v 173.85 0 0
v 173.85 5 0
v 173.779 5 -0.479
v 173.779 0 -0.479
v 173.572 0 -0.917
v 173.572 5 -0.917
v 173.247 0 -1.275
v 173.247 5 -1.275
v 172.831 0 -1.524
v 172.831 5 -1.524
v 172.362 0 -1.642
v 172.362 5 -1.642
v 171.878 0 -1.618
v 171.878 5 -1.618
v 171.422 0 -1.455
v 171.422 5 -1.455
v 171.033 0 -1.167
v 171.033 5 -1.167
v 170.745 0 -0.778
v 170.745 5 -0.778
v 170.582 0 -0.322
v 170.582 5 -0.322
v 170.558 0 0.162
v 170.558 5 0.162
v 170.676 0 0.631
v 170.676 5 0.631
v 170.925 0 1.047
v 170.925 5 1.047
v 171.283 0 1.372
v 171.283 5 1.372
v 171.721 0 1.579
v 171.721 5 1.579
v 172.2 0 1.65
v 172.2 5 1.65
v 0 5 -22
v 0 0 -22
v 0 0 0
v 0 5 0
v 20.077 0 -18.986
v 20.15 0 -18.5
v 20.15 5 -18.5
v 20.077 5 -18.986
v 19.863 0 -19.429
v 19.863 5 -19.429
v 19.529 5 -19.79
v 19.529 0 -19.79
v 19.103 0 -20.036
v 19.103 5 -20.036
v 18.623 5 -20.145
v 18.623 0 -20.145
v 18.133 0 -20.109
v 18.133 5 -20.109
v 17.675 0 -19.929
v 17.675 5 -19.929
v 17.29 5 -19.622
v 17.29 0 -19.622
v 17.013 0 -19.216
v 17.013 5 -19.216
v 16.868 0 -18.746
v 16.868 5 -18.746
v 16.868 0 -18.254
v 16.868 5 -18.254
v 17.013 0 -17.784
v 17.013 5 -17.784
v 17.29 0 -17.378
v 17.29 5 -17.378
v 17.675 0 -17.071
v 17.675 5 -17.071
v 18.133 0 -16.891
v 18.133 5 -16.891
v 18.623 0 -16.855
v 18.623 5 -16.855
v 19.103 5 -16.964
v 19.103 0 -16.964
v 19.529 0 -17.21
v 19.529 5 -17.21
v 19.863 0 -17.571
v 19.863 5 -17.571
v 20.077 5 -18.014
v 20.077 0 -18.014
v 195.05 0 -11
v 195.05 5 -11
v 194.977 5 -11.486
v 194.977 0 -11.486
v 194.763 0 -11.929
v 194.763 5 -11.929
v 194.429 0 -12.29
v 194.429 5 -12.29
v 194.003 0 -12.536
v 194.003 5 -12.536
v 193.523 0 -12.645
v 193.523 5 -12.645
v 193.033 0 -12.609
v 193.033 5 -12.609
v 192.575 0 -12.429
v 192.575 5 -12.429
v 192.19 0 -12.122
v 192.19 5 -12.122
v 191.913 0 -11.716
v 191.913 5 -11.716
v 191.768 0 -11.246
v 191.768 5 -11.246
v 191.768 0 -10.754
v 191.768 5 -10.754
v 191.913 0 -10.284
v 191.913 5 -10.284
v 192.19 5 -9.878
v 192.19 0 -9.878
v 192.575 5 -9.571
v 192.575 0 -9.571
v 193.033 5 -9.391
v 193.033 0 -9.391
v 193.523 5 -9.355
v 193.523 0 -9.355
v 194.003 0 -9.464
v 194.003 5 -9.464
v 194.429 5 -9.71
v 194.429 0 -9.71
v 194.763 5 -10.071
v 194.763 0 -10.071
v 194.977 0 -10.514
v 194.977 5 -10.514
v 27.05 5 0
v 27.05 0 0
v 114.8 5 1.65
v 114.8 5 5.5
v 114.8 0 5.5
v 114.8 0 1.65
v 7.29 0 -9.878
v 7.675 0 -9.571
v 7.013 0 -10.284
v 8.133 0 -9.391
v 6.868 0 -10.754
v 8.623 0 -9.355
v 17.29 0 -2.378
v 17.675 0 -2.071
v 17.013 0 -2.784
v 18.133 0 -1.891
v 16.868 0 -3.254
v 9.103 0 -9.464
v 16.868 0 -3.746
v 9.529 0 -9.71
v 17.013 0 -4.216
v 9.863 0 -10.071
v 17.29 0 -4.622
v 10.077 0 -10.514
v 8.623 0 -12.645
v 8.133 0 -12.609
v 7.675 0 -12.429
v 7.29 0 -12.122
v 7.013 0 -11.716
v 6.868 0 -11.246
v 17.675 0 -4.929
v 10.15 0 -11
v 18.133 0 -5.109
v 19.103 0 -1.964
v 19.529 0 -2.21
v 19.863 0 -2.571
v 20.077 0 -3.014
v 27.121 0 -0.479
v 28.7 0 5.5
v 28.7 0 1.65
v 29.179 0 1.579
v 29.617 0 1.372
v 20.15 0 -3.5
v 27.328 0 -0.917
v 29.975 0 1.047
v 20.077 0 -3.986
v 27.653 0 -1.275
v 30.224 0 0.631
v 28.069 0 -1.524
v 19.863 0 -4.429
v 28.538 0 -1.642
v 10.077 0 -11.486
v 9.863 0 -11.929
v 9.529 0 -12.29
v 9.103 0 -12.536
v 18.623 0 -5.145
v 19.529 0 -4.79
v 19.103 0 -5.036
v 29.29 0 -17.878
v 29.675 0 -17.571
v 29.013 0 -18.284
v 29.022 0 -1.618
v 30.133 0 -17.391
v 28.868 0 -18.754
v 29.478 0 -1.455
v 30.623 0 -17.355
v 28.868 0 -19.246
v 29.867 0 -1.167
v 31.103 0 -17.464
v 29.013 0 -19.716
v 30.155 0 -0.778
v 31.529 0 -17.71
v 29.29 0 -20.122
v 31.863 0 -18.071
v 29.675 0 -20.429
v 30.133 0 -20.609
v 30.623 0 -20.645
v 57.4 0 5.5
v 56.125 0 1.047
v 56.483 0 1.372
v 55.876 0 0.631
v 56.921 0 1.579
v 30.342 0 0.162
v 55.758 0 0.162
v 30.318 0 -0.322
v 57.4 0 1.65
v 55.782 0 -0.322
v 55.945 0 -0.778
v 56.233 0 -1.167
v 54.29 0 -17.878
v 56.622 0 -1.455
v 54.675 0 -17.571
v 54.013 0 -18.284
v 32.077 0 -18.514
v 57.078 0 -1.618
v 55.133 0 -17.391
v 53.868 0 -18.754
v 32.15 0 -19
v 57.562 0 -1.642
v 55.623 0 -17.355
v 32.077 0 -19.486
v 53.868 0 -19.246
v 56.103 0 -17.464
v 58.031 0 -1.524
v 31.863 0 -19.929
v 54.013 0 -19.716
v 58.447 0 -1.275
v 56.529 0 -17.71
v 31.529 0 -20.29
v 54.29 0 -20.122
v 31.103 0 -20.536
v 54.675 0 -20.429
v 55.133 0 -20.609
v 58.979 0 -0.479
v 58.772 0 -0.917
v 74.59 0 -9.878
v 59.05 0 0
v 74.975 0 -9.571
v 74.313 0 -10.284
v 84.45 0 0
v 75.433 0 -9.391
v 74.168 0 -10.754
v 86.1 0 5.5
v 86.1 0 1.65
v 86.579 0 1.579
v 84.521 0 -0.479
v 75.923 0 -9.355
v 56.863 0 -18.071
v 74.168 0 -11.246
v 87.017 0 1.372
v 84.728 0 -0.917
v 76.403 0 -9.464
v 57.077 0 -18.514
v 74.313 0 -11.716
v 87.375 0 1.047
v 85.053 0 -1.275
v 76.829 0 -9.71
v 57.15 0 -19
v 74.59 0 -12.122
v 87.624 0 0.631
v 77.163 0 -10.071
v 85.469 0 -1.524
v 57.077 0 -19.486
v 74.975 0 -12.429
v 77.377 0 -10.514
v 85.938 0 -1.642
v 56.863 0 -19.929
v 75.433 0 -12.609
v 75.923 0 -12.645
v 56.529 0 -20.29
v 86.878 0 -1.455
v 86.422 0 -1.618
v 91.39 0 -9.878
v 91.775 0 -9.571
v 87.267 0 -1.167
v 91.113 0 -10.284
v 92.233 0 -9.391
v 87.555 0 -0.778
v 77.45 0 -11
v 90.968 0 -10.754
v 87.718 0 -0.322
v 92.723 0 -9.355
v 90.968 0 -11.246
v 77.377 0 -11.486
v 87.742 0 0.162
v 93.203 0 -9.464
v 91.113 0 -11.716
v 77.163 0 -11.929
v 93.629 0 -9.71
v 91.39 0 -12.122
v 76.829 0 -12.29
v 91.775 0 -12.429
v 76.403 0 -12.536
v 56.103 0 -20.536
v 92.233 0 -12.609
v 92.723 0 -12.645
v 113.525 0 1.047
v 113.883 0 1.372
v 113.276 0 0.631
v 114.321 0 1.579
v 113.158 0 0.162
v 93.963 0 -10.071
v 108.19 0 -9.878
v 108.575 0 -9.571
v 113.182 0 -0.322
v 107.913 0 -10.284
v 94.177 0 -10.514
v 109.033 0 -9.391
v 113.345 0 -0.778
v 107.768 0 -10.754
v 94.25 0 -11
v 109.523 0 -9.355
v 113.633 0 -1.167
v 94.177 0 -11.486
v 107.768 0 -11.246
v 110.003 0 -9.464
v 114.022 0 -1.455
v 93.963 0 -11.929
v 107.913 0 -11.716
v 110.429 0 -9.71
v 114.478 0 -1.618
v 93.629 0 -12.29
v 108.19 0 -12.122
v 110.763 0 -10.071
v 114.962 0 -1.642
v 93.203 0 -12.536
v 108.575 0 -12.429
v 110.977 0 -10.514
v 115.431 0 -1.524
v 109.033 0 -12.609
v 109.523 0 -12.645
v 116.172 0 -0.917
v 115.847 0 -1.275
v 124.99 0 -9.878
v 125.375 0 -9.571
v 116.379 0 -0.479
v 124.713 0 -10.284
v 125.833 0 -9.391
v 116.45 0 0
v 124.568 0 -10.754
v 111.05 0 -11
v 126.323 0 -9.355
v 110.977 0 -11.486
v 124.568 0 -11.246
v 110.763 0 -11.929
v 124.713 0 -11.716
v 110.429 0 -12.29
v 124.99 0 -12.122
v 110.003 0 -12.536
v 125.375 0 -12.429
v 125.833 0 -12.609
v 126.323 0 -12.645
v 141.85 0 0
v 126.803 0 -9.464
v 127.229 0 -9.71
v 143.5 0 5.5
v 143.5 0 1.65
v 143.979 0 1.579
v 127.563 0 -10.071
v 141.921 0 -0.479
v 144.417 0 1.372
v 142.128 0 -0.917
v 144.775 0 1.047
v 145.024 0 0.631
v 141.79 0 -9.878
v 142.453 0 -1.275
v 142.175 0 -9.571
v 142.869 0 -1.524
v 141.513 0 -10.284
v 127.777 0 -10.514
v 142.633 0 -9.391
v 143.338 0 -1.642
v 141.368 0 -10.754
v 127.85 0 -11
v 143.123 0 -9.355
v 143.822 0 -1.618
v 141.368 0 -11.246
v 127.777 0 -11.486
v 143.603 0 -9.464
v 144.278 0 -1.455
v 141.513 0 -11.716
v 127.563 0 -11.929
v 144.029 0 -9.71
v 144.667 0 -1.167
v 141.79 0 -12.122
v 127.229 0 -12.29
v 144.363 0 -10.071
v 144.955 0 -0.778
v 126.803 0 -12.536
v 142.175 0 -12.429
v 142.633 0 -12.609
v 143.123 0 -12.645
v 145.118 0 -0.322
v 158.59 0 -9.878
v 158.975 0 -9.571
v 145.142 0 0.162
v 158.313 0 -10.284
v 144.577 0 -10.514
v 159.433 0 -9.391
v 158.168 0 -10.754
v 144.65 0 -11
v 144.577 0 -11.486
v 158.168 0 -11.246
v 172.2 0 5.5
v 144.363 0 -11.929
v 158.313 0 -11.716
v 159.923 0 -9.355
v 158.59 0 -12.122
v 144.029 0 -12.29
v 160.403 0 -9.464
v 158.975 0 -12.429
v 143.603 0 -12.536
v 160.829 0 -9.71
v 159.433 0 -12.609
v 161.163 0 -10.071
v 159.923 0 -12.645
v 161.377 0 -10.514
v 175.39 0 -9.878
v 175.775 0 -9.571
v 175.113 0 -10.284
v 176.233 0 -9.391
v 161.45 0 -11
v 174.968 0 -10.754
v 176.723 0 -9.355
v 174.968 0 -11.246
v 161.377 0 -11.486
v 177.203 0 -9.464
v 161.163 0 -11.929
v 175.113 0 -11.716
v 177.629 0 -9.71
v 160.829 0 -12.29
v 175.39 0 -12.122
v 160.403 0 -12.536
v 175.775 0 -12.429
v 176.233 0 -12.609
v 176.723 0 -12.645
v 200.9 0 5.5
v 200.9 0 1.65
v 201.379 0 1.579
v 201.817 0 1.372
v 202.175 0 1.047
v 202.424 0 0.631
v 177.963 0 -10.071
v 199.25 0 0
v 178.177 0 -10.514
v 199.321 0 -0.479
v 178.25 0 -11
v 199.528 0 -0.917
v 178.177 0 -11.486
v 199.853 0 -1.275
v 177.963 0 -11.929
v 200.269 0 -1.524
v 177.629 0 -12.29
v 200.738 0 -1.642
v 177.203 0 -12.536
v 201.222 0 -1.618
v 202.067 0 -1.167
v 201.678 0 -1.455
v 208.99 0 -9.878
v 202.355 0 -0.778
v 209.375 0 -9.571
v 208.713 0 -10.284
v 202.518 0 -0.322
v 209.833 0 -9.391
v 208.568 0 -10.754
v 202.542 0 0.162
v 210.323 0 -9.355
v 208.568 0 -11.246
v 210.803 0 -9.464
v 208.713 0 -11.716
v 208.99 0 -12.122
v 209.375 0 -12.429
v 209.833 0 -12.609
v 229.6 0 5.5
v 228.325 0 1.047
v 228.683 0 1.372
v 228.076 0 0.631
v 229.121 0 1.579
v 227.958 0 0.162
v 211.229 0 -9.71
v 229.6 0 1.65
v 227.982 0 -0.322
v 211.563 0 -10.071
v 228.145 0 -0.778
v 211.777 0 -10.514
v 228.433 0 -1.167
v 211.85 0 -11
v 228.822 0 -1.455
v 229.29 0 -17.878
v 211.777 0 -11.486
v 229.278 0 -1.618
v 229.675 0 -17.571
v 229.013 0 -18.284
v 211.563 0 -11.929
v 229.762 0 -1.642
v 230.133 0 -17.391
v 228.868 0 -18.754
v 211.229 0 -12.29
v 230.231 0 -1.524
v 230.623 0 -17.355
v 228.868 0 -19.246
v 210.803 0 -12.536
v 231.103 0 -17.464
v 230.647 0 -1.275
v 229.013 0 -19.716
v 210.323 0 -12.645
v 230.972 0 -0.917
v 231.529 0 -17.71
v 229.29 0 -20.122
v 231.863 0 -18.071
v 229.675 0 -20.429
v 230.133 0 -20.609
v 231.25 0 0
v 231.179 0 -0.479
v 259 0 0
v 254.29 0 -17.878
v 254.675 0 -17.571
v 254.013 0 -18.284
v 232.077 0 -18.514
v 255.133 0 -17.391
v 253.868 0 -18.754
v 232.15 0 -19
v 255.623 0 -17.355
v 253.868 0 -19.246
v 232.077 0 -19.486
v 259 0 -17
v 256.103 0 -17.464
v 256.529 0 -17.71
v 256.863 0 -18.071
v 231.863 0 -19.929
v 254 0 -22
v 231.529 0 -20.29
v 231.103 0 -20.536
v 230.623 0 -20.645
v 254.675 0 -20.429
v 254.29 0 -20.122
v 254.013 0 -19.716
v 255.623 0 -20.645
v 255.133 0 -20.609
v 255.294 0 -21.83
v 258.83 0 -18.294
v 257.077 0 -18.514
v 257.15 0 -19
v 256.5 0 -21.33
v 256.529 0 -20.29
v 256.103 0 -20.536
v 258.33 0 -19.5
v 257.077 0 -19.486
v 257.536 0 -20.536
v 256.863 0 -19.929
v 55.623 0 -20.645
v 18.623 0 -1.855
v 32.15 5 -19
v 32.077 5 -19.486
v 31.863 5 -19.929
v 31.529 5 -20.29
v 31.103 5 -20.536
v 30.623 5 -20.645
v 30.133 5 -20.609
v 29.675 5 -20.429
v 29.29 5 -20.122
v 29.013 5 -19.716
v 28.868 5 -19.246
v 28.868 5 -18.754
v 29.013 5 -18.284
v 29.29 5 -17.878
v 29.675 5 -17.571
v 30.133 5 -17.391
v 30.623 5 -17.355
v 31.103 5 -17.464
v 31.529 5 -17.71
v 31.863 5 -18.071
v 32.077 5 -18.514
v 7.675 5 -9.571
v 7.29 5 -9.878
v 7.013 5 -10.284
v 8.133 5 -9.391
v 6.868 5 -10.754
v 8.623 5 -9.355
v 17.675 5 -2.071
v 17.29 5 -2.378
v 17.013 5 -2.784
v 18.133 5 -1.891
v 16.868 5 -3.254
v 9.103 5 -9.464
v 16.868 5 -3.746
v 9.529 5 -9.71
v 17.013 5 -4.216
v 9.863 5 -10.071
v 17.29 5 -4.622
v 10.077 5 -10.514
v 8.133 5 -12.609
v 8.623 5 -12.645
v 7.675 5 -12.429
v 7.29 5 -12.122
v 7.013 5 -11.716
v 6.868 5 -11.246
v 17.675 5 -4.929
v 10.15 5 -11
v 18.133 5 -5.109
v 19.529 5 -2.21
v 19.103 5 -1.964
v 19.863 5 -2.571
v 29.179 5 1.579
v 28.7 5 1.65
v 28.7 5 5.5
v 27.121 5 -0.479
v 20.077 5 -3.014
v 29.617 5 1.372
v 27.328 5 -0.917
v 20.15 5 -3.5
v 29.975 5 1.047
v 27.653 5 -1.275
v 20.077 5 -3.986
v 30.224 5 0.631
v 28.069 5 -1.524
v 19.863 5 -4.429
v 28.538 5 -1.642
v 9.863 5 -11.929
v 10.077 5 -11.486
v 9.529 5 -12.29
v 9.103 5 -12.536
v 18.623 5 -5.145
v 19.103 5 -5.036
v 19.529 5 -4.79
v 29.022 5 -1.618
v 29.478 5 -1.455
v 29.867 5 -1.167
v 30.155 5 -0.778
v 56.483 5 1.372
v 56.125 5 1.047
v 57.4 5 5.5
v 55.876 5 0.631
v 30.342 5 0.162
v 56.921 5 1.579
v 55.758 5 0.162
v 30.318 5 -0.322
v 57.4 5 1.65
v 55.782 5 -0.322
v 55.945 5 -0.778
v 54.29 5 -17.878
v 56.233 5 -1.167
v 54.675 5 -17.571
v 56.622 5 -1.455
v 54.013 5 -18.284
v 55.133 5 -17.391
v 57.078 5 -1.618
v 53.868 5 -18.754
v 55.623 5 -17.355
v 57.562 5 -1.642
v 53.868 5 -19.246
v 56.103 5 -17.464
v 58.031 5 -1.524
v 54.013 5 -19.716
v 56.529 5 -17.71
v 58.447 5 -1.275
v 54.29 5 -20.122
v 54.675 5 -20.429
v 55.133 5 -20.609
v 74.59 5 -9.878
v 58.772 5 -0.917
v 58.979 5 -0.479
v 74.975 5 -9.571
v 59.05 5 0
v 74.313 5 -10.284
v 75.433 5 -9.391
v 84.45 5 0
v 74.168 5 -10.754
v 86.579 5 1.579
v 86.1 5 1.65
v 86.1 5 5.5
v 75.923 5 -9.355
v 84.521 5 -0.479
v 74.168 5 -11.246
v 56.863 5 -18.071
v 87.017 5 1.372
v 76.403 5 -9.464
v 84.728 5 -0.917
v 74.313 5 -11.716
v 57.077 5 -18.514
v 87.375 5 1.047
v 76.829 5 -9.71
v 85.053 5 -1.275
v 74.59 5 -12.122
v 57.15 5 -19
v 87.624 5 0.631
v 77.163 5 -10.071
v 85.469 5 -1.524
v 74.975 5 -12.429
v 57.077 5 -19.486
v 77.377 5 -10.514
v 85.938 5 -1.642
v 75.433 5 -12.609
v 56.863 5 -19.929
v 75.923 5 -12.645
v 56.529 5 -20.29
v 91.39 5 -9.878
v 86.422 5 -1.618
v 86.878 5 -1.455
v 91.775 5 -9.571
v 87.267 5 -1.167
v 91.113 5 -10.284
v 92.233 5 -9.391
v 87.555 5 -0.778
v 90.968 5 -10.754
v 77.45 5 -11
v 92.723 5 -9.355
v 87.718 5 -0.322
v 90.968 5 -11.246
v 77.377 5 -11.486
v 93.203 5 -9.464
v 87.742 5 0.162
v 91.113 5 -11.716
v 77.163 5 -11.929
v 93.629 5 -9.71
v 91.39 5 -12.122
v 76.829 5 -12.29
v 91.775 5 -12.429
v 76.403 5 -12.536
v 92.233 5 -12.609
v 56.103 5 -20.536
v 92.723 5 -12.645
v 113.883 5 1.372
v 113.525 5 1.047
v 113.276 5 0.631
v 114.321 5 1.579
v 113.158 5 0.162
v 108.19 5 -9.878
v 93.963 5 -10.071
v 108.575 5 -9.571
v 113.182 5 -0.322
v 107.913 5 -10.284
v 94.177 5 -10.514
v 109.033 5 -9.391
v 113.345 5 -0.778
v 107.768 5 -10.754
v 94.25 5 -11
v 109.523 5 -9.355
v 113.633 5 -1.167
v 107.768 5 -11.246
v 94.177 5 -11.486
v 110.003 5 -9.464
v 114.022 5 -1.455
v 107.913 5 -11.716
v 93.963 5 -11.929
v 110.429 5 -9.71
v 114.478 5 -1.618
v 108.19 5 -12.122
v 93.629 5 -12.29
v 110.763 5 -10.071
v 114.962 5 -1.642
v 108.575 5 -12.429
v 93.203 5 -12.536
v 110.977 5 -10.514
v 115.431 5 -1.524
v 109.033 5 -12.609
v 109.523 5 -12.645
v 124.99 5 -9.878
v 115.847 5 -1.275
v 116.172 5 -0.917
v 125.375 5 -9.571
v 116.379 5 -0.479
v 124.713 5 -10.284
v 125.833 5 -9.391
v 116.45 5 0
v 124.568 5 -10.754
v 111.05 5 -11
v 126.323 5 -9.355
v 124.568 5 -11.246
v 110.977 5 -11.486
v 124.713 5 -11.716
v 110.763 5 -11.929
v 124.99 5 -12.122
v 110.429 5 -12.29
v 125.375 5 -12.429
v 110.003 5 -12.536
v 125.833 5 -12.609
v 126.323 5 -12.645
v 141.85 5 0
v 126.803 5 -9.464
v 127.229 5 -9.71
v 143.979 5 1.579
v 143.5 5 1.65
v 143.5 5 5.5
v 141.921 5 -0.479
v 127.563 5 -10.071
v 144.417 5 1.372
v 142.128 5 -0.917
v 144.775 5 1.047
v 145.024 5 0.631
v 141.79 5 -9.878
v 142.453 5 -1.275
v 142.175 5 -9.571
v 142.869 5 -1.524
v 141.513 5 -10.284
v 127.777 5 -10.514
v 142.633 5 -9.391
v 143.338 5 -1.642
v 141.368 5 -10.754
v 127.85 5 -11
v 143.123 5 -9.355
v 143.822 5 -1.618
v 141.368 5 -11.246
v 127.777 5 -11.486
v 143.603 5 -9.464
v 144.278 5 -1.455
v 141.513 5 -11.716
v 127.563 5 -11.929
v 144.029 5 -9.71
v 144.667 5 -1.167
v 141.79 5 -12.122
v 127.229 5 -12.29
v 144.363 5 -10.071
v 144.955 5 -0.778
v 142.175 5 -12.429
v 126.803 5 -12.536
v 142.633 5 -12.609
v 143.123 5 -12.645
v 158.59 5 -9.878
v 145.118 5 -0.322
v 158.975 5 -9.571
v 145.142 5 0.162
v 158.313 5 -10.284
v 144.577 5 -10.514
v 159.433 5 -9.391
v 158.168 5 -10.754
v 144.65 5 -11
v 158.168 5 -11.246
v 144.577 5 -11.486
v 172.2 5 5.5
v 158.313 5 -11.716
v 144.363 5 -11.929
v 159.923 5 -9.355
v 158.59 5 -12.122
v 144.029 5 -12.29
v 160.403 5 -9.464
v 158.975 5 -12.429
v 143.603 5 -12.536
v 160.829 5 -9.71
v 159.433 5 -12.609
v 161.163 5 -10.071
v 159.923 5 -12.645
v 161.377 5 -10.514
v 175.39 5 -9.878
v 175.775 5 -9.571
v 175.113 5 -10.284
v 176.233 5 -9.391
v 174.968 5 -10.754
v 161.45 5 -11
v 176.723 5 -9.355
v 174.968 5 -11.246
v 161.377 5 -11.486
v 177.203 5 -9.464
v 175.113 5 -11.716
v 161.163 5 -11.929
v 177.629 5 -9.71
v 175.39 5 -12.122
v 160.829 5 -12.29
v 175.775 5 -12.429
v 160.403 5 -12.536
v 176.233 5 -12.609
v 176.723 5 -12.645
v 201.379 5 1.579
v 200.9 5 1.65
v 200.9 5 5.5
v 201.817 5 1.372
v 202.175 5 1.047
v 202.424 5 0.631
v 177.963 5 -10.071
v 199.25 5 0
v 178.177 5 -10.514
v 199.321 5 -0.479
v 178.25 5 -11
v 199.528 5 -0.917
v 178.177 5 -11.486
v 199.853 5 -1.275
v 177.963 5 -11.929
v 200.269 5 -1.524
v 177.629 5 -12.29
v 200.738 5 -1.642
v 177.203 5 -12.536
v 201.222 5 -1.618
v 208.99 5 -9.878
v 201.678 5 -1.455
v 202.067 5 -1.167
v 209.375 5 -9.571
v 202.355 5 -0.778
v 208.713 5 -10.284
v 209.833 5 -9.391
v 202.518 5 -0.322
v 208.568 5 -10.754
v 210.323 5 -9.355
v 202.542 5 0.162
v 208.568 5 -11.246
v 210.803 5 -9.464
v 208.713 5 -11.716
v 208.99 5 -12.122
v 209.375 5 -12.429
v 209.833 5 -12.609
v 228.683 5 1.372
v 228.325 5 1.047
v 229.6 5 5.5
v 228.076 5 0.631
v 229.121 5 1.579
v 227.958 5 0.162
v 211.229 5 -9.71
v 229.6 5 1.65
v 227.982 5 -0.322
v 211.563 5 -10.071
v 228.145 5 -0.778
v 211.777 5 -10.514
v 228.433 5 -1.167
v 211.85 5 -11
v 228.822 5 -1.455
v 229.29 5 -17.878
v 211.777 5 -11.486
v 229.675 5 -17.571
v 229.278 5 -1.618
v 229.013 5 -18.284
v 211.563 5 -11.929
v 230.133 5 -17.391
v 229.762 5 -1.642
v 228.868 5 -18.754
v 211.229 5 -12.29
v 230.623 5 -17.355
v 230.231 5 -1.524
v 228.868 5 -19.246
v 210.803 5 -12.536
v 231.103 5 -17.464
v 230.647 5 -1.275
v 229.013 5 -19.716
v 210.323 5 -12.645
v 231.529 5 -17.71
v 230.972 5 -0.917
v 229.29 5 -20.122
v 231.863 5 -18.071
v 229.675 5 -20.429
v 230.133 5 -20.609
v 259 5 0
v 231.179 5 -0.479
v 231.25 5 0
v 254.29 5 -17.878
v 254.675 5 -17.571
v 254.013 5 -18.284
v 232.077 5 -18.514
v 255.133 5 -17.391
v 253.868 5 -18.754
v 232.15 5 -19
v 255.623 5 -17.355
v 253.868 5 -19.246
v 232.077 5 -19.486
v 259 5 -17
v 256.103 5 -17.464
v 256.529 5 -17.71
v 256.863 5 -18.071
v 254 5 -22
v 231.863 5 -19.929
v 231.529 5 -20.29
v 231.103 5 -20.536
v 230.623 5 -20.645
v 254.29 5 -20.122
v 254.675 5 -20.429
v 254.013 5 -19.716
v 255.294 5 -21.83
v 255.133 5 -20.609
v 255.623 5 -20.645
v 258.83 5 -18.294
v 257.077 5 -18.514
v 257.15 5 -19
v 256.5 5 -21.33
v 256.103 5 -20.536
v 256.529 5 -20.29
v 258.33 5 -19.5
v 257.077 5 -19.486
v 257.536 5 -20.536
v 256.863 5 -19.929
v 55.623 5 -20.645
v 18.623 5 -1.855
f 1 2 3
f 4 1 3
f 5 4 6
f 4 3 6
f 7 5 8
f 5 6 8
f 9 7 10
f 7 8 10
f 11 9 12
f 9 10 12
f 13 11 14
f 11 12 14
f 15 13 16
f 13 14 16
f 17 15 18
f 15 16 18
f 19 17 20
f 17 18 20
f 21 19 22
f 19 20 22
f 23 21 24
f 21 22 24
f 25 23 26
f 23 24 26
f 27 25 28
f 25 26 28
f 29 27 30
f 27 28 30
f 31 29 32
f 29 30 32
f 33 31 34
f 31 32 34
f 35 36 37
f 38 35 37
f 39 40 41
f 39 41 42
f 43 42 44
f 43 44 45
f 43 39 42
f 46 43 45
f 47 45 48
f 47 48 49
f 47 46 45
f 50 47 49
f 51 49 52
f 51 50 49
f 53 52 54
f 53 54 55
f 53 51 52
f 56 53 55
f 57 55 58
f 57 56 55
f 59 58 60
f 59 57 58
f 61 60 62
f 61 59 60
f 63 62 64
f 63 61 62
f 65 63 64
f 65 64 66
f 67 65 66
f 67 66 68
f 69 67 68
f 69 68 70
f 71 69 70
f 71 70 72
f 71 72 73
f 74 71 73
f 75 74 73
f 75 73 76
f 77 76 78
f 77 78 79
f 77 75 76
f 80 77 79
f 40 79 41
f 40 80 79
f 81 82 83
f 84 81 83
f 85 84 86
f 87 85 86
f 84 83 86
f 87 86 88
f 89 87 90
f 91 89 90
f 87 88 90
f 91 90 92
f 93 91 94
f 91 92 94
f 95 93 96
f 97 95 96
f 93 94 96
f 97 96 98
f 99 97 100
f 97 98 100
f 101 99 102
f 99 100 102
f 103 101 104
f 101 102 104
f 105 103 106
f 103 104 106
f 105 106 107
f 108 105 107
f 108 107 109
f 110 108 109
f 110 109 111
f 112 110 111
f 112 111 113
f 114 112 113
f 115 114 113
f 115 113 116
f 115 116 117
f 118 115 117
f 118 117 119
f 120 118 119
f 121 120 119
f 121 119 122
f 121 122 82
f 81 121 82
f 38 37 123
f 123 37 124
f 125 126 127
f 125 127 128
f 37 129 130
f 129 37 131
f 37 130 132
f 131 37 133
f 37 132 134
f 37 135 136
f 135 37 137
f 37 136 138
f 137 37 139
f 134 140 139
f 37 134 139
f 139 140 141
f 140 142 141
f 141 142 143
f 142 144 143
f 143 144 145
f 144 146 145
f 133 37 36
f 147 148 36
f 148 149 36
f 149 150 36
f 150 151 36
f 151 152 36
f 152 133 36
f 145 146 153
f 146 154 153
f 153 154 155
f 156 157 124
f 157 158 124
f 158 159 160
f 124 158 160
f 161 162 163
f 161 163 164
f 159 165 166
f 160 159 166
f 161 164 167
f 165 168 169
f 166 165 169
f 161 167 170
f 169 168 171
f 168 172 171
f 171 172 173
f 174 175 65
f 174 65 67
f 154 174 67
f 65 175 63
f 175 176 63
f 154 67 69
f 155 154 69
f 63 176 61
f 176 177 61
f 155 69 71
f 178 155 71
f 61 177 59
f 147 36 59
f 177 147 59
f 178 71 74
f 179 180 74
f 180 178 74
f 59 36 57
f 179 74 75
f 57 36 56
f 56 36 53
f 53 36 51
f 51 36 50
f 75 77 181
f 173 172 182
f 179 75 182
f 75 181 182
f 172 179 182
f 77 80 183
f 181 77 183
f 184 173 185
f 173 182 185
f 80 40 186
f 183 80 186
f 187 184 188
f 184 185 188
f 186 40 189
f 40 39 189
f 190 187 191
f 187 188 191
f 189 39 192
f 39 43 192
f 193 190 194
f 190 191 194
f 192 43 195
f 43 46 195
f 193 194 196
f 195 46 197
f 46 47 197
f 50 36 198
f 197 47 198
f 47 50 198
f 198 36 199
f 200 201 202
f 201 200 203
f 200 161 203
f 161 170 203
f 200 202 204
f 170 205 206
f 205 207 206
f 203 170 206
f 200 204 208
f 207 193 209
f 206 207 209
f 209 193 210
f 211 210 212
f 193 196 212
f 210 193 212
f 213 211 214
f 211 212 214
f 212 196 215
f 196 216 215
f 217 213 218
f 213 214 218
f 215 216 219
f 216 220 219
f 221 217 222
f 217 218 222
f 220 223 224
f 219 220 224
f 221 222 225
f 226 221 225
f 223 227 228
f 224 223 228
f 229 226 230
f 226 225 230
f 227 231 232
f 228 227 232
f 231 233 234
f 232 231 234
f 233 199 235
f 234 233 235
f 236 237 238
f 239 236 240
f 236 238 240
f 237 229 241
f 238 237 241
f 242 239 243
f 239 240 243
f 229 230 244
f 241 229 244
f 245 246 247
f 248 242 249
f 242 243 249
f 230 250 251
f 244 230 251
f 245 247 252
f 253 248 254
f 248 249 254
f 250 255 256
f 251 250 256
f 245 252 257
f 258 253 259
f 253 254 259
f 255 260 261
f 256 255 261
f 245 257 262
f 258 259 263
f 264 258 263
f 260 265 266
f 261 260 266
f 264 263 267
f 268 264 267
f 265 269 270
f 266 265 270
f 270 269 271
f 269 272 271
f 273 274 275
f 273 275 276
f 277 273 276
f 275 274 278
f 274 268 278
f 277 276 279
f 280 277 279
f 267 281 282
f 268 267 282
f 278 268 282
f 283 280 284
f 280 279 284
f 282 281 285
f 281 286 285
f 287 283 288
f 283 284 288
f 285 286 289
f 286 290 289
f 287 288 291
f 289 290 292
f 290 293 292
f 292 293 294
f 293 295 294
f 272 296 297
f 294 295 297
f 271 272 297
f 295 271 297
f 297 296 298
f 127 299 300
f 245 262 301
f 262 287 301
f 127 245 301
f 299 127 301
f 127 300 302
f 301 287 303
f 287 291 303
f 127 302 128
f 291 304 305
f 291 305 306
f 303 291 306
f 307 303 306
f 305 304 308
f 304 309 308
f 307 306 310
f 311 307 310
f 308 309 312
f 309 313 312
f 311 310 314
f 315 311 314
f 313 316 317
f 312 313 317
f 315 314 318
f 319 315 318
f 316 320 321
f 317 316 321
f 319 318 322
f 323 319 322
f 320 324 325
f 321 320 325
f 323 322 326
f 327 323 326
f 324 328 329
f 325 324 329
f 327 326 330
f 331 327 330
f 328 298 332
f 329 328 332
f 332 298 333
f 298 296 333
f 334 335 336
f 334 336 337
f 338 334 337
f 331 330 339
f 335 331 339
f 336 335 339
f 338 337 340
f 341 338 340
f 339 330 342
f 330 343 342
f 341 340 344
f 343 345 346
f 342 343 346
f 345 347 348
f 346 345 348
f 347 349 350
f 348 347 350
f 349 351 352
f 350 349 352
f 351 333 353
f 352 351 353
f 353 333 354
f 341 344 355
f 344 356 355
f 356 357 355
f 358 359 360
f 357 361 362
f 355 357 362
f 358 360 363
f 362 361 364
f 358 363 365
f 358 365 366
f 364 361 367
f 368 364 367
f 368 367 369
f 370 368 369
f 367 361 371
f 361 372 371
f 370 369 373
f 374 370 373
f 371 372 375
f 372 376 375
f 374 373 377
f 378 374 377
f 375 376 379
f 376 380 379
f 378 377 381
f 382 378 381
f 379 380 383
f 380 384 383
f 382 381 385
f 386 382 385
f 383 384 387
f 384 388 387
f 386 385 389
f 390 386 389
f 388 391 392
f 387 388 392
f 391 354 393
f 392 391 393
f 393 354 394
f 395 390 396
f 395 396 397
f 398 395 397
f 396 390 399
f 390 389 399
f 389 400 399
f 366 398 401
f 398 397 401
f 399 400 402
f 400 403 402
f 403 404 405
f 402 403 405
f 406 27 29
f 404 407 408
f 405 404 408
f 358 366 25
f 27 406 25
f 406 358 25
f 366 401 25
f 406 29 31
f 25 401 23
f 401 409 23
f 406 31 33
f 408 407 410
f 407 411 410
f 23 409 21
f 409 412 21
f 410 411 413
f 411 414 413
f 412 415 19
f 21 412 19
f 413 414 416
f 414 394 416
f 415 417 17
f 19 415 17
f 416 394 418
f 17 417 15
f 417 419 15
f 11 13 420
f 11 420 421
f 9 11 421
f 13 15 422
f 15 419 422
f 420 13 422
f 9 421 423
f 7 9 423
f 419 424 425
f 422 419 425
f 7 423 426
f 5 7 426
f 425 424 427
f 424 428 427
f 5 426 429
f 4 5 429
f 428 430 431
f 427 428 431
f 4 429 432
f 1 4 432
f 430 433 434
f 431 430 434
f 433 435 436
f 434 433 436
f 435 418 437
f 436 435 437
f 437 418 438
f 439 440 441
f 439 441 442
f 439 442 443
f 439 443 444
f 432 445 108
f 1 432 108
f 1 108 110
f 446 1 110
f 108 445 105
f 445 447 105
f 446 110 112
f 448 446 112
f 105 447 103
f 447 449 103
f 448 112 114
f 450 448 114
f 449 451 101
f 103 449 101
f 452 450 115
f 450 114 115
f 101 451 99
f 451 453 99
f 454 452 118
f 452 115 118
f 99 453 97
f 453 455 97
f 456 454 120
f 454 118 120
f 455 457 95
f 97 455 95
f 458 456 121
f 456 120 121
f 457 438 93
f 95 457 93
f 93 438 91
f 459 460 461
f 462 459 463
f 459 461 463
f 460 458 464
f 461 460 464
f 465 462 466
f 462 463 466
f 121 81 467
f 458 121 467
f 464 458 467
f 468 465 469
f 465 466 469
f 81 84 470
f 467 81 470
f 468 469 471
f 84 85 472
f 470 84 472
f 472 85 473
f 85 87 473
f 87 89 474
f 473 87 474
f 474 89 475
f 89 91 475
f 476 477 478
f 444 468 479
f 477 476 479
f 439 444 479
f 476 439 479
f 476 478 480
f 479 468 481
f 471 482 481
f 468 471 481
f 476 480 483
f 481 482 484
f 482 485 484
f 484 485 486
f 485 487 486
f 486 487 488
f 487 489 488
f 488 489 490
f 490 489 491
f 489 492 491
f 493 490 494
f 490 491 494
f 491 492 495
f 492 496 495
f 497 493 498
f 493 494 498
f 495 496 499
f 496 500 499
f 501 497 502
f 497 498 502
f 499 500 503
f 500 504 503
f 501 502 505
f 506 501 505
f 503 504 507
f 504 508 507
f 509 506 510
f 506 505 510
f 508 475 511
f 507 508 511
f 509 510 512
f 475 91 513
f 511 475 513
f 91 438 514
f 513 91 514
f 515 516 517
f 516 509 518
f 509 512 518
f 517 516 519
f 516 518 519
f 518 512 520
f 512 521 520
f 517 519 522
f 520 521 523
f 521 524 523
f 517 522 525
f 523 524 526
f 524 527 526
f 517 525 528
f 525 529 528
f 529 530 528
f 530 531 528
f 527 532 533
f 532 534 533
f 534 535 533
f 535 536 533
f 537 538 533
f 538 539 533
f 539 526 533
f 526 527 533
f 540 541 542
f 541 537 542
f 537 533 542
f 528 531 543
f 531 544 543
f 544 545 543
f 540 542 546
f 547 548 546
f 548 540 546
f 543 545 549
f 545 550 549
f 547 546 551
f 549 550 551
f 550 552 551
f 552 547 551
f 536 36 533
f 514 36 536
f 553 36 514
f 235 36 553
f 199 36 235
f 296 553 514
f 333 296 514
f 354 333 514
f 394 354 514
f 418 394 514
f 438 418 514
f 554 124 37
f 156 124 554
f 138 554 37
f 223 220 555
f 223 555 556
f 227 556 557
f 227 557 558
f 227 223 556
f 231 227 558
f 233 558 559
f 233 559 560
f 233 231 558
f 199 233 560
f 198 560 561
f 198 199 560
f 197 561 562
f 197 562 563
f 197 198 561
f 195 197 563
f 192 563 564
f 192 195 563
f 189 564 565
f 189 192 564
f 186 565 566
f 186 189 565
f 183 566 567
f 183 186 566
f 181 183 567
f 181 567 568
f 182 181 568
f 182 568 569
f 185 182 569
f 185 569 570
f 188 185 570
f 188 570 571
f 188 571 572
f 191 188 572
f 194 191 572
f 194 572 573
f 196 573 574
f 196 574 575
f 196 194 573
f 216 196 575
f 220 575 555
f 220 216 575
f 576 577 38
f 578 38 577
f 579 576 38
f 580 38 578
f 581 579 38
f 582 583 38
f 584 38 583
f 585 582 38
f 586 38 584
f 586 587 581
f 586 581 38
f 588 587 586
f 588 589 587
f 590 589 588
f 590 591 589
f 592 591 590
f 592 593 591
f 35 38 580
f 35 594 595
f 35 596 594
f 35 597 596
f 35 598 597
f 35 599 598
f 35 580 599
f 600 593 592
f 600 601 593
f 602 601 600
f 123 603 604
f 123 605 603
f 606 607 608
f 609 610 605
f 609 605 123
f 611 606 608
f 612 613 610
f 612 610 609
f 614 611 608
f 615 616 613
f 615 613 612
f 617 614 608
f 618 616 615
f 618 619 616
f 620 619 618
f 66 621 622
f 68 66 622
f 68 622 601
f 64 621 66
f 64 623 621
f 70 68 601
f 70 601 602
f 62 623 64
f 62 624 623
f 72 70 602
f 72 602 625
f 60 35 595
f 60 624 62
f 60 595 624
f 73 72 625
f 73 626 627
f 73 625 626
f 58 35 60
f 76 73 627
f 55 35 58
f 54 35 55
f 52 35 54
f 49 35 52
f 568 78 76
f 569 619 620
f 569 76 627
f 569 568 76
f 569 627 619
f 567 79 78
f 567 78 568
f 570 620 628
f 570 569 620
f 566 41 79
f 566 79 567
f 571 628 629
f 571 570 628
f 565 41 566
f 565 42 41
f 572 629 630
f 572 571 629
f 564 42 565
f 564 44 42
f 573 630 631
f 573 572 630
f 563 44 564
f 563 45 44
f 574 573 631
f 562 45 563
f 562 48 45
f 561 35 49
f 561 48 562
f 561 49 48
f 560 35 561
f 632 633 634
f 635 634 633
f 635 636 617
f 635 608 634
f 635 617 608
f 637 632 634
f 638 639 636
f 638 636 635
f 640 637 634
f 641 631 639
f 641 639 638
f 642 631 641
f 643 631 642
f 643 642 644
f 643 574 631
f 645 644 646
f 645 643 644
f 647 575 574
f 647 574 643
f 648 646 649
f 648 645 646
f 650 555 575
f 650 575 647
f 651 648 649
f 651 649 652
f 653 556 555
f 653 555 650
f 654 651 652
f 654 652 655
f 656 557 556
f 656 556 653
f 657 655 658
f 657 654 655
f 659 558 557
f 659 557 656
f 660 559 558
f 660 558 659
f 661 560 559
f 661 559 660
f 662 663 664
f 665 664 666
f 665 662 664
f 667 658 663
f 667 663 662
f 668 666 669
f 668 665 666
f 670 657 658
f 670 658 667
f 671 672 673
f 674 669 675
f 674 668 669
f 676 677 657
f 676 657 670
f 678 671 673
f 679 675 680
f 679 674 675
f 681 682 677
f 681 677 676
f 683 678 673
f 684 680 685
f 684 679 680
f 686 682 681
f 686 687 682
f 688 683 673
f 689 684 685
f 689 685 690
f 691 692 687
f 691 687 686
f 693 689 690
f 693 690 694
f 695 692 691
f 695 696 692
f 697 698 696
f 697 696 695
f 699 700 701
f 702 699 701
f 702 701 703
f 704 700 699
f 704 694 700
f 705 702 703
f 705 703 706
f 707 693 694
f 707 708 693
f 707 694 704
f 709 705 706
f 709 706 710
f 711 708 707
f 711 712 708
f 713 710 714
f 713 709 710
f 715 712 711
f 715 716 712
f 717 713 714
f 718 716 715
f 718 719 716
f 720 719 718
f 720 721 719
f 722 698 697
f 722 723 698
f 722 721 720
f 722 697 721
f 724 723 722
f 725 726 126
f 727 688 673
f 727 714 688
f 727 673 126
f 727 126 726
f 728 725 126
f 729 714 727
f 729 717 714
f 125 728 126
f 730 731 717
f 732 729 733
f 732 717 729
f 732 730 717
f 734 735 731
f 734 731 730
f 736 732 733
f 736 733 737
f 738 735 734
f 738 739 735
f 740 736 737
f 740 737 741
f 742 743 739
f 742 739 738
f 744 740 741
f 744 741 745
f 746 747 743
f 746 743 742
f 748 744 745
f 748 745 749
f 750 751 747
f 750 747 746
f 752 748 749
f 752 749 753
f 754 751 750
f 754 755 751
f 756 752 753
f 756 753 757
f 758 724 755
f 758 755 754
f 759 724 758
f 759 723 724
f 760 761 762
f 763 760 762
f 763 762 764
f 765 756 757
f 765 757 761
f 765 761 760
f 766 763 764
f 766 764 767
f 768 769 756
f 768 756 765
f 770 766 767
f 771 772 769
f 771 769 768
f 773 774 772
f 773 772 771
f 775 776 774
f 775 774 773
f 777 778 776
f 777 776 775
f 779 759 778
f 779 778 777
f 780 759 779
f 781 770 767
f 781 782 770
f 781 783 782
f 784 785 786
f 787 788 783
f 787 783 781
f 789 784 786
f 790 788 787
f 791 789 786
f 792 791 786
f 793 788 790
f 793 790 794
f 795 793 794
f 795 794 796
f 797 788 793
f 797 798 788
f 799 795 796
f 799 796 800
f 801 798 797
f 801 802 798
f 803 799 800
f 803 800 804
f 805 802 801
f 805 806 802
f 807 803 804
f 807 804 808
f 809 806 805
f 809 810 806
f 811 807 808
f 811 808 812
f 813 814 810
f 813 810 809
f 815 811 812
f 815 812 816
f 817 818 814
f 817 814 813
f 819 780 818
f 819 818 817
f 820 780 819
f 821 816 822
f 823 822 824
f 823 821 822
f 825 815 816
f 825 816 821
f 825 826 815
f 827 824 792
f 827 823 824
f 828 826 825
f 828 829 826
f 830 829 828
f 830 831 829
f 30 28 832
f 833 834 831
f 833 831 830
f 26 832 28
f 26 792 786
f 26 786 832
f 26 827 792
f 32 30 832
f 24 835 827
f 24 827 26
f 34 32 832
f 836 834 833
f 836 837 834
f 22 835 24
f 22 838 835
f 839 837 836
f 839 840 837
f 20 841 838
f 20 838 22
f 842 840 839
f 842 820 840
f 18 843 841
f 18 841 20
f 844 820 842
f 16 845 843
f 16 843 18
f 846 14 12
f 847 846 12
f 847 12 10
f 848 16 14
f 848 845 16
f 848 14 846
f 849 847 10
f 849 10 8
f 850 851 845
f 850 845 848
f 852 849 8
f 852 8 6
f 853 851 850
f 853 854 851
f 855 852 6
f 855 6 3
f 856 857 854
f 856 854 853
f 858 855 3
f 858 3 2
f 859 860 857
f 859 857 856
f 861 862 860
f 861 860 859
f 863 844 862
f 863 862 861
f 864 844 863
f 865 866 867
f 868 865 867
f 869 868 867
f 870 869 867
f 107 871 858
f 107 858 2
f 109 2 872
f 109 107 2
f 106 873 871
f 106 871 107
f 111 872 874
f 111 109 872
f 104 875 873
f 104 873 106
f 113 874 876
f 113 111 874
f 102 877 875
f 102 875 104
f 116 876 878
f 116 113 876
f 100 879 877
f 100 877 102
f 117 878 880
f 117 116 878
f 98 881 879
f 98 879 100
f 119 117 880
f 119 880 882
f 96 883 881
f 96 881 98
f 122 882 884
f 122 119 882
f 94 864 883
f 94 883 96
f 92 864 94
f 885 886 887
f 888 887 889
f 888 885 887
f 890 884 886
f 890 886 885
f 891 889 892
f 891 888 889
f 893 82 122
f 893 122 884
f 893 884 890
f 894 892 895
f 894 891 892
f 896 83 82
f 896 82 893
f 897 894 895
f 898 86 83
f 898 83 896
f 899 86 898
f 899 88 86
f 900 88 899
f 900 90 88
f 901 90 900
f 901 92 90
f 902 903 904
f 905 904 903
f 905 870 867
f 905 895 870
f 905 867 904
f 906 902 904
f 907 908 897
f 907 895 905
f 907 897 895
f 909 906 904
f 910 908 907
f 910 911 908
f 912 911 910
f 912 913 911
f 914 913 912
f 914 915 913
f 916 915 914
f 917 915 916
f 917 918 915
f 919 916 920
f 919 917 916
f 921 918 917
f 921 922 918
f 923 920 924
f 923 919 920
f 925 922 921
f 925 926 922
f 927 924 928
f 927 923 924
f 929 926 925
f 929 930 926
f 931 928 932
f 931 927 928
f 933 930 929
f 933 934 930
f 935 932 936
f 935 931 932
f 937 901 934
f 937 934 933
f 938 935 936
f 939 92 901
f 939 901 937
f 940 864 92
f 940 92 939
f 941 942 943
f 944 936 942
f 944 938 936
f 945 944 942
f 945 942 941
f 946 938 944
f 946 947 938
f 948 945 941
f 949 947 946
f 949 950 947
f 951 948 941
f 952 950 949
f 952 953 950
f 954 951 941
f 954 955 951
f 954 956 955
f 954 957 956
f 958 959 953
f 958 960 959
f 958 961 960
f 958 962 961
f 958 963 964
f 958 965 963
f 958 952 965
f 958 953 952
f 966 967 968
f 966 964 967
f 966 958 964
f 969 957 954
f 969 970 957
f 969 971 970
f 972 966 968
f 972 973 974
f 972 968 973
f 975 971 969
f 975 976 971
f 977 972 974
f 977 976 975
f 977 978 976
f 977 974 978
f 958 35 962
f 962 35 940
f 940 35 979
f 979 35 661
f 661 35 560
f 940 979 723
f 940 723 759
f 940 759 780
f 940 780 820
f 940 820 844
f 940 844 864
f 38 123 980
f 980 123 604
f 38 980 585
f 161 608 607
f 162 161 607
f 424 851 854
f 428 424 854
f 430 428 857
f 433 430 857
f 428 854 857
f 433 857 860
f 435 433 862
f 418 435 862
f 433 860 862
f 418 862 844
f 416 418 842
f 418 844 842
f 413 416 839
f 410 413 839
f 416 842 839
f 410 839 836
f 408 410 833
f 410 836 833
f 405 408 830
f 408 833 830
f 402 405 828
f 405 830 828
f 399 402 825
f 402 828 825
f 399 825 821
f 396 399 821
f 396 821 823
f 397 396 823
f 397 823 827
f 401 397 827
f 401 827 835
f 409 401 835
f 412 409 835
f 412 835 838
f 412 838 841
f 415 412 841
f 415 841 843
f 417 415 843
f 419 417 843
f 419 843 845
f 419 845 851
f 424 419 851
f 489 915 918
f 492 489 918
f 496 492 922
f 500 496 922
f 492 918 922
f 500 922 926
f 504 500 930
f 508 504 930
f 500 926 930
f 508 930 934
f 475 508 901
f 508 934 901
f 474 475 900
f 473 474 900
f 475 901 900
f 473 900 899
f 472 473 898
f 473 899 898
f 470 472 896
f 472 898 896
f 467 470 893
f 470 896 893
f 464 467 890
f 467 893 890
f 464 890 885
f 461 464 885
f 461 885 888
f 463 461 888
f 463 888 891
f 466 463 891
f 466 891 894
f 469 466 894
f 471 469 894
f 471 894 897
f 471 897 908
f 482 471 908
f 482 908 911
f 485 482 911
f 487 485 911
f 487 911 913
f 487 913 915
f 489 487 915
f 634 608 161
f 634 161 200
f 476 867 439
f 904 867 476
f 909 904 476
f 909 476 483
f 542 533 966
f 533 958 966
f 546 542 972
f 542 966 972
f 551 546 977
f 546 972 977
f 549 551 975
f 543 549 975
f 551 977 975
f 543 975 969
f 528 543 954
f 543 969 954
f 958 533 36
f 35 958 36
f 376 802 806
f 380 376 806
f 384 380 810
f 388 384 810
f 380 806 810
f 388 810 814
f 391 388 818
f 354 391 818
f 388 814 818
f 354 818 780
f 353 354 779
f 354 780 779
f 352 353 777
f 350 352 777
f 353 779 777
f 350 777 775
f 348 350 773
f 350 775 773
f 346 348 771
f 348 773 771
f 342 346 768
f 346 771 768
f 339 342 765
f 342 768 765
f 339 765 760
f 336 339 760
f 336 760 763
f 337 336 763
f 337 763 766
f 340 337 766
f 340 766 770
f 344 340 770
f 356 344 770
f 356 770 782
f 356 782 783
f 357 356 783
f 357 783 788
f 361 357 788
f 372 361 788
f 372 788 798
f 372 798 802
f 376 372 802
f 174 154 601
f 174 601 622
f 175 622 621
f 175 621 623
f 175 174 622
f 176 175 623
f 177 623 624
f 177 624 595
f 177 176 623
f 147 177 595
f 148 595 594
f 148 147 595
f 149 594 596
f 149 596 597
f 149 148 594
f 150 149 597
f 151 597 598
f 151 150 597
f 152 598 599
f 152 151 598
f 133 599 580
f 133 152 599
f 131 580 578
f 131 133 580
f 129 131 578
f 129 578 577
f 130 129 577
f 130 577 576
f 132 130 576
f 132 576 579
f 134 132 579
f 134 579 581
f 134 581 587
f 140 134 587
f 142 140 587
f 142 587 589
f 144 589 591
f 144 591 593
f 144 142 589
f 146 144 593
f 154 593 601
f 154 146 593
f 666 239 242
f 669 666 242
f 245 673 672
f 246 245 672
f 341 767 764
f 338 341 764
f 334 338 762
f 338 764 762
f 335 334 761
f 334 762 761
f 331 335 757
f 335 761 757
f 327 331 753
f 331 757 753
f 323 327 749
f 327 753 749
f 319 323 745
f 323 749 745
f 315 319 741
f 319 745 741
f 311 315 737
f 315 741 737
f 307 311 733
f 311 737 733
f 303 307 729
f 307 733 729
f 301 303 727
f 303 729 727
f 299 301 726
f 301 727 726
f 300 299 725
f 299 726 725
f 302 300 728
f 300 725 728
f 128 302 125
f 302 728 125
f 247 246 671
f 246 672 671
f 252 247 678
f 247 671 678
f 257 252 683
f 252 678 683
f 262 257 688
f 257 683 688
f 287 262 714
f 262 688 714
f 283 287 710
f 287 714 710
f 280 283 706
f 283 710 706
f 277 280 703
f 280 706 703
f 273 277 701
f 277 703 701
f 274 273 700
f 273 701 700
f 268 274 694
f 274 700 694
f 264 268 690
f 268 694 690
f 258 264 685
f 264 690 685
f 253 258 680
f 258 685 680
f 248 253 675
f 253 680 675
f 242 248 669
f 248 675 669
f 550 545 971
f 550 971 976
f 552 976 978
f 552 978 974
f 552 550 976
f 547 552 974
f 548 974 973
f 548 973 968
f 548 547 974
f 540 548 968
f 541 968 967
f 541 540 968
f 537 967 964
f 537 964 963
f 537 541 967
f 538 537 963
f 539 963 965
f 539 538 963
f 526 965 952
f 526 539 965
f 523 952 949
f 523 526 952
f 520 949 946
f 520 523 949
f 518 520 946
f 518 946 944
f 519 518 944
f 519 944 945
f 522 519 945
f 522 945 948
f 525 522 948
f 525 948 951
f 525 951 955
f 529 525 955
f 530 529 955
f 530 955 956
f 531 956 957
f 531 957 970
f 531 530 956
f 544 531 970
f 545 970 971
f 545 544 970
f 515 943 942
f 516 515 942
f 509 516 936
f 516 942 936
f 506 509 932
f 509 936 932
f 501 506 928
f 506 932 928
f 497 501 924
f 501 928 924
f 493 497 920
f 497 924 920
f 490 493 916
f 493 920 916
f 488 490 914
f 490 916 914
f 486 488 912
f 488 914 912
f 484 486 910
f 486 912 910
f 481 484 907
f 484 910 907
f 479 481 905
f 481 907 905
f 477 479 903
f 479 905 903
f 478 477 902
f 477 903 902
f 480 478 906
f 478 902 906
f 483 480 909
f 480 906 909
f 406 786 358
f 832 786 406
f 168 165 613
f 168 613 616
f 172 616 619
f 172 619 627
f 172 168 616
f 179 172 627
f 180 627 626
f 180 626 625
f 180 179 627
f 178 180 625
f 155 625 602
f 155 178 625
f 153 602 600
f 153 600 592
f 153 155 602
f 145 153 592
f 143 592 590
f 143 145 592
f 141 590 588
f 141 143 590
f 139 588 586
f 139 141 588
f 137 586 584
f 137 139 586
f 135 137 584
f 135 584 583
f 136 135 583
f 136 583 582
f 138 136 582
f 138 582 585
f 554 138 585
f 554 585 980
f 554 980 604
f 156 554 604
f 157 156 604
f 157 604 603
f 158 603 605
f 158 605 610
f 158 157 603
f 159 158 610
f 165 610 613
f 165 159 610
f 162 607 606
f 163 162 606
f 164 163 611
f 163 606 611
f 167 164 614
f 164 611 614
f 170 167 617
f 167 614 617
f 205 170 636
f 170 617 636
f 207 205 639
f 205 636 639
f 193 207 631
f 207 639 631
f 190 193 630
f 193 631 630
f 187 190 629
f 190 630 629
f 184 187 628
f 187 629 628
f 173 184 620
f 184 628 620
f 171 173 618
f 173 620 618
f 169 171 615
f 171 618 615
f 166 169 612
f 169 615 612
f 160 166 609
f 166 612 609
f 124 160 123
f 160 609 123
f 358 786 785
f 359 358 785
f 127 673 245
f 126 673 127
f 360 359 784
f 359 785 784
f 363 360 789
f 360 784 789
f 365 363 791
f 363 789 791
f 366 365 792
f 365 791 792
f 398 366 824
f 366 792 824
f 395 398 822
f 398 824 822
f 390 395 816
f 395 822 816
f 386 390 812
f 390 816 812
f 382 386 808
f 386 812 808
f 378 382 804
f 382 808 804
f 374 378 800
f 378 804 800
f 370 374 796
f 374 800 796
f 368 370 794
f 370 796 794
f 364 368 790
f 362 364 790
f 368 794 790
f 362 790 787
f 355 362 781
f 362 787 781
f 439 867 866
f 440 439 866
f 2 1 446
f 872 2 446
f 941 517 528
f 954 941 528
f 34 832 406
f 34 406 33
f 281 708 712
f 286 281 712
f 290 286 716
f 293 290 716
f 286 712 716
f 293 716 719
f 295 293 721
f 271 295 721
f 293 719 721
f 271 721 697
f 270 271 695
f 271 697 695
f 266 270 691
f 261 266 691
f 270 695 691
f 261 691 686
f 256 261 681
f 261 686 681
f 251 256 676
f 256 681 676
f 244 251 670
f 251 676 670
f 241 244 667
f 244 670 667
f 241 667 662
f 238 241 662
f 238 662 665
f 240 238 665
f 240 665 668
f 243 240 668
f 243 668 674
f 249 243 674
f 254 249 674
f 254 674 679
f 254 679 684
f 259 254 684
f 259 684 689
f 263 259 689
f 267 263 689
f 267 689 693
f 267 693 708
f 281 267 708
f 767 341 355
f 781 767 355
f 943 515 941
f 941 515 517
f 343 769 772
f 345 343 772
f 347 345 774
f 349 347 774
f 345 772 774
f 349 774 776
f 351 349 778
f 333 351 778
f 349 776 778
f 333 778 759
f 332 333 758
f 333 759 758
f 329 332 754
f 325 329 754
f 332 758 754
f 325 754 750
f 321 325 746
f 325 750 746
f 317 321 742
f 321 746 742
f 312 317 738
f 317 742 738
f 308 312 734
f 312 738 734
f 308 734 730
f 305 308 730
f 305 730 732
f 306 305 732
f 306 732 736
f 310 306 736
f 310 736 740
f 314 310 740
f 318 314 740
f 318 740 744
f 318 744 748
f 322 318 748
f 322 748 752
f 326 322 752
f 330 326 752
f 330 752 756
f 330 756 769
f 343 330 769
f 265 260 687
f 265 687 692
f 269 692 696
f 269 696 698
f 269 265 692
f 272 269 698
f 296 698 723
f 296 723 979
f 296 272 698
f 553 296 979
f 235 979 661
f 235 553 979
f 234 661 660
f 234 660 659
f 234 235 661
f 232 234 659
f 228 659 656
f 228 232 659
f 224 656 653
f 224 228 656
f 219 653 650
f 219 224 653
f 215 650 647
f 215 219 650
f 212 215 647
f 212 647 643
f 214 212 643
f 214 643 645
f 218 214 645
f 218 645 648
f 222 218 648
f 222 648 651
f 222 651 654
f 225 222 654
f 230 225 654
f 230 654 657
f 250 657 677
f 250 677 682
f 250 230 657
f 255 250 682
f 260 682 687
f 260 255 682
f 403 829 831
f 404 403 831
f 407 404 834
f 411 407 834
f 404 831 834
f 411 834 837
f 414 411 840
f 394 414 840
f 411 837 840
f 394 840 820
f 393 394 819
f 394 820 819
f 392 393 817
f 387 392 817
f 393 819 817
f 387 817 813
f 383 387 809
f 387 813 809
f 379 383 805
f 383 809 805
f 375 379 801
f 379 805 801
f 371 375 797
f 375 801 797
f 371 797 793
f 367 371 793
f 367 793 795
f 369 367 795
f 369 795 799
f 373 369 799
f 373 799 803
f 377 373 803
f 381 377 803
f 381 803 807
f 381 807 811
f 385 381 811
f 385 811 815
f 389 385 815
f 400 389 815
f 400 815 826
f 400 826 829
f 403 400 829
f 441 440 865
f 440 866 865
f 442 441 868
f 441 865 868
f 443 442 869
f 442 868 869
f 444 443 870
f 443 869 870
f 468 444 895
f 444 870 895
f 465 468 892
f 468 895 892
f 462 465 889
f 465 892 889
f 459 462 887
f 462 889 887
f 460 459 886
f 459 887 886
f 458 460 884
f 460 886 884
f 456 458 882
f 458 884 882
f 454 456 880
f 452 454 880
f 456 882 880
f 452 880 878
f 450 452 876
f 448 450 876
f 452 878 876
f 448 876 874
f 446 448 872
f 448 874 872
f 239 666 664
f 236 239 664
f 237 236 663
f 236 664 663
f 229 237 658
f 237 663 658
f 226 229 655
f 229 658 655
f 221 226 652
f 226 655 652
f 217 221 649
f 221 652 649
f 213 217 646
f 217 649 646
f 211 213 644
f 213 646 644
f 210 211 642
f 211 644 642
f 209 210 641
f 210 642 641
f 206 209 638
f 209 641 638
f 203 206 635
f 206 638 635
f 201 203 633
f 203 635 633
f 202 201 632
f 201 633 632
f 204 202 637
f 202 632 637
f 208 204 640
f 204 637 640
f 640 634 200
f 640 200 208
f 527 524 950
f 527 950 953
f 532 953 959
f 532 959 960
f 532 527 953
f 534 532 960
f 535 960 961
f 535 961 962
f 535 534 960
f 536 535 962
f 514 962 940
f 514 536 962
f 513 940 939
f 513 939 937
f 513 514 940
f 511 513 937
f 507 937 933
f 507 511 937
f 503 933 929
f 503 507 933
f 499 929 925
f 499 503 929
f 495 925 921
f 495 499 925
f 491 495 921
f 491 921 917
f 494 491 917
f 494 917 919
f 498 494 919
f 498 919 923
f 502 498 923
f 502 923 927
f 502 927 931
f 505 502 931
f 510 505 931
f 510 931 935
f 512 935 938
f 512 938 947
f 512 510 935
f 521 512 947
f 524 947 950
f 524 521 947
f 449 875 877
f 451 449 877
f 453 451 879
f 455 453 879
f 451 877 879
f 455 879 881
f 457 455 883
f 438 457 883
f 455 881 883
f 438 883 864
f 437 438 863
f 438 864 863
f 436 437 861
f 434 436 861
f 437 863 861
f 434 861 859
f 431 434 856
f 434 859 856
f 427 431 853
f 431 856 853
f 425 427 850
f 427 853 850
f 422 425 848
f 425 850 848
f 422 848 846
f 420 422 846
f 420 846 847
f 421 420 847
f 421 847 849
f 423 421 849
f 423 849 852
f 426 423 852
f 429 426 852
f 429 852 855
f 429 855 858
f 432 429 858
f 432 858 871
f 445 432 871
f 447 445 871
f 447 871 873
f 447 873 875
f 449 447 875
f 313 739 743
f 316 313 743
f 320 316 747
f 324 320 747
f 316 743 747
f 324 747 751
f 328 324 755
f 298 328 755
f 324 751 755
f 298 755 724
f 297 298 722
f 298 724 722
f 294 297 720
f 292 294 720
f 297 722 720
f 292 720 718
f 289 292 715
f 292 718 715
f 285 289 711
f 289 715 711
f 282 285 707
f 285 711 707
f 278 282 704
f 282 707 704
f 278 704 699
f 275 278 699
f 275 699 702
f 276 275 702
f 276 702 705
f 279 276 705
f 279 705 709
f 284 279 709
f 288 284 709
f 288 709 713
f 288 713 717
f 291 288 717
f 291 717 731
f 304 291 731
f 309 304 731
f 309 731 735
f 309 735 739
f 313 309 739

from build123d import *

# Parameters (mm, degrees)
SKETCH1_R           = 1.65
BOSS_EXTRUDE1_DEPTH = 5
SKETCH4_W           = 28.7
SKETCH4_H           = 5.5
BOSS_EXTRUDE3_DEPTH = 5
SKETCH5_R           = 1.65
CUT_EXTRUDE2_DEPTH  = 6
SKETCH6_R           = 1.65
CUT_EXTRUDE3_DEPTH  = 6
FILLET1_R           = 5


with BuildPart() as part:
    # Sketch1 → Boss-Extrude1 (new body)
    with BuildSketch(Plane(origin=(0, 0, 0), x_dir=(1, 0, 0), z_dir=(0, 1, 0))):
        Polygon((0, 0), (227, 0), (259, 0), (259, 22), (227, 22), (0, 22), align=None)
        with Locations((230.5, 19)):
            Circle(SKETCH1_R, mode=Mode.SUBTRACT)
        with Locations((255.5, 19)):
            Circle(SKETCH1_R, mode=Mode.SUBTRACT)
        with Locations((30.5, 19)):
            Circle(SKETCH1_R, mode=Mode.SUBTRACT)
        with Locations((55.5, 19)):
            Circle(SKETCH1_R, mode=Mode.SUBTRACT)
        with Locations((8.5, 11)):
            Circle(SKETCH1_R, mode=Mode.SUBTRACT)
        with Locations((18.5, 18.5)):
            Circle(SKETCH1_R, mode=Mode.SUBTRACT)
        with Locations((18.5, 3.5)):
            Circle(SKETCH1_R, mode=Mode.SUBTRACT)
    extrude(amount=BOSS_EXTRUDE1_DEPTH)

    # Sketch4 → Boss-Extrude3 (add)
    with BuildSketch(Plane(origin=(0, 5, 0), x_dir=(1, 0, 0), z_dir=(0, 1, 0))):
        with Locations((43.05, -2.75)):
            Rectangle(SKETCH4_W, SKETCH4_H)
        with Locations((100.45, -2.75)):
            Rectangle(SKETCH4_W, SKETCH4_H)
        with Locations((157.85, -2.75)):
            Rectangle(SKETCH4_W, SKETCH4_H)
        with Locations((215.25, -2.75)):
            Rectangle(SKETCH4_W, SKETCH4_H)
    extrude(amount=-BOSS_EXTRUDE3_DEPTH)

    # Sketch5 → Cut-Extrude2 (cut, through all)
    with BuildSketch(Plane(origin=(0, 5, 0), x_dir=(1, 0, 0), z_dir=(0, 1, 0))):
        with Locations((28.7, 0)):
            Circle(SKETCH5_R)
        with Locations((57.4, 0)):
            Circle(SKETCH5_R)
        with Locations((86.1, 0)):
            Circle(SKETCH5_R)
        with Locations((114.8, 0)):
            Circle(SKETCH5_R)
        with Locations((143.5, 0)):
            Circle(SKETCH5_R)
        with Locations((172.2, 0)):
            Circle(SKETCH5_R)
        with Locations((200.9, 0)):
            Circle(SKETCH5_R)
        with Locations((229.6, 0)):
            Circle(SKETCH5_R)
    extrude(amount=-CUT_EXTRUDE2_DEPTH, mode=Mode.SUBTRACT)

    # Sketch6 → Cut-Extrude3 (cut, through all)
    with BuildSketch(Plane(origin=(0, 5, 0), x_dir=(1, 0, 0), z_dir=(0, 1, 0))):
        with Locations((75.8, 11)):
            Circle(SKETCH6_R)
        with Locations((92.6, 11)):
            Circle(SKETCH6_R)
        with Locations((109.4, 11)):
            Circle(SKETCH6_R)
        with Locations((126.2, 11)):
            Circle(SKETCH6_R)
        with Locations((143, 11)):
            Circle(SKETCH6_R)
        with Locations((159.8, 11)):
            Circle(SKETCH6_R)
        with Locations((176.6, 11)):
            Circle(SKETCH6_R)
        with Locations((193.4, 11)):
            Circle(SKETCH6_R)
        with Locations((210.2, 11)):
            Circle(SKETCH6_R)
    extrude(amount=-CUT_EXTRUDE3_DEPTH, mode=Mode.SUBTRACT)

    # Fillet1
    fillet1_edges = [part.edges().sort_by_distance(p)[0] for p in [
        (259, 2.5, -22),
    ]]
    fillet(fillet1_edges, radius=FILLET1_R)


solid = part.part
